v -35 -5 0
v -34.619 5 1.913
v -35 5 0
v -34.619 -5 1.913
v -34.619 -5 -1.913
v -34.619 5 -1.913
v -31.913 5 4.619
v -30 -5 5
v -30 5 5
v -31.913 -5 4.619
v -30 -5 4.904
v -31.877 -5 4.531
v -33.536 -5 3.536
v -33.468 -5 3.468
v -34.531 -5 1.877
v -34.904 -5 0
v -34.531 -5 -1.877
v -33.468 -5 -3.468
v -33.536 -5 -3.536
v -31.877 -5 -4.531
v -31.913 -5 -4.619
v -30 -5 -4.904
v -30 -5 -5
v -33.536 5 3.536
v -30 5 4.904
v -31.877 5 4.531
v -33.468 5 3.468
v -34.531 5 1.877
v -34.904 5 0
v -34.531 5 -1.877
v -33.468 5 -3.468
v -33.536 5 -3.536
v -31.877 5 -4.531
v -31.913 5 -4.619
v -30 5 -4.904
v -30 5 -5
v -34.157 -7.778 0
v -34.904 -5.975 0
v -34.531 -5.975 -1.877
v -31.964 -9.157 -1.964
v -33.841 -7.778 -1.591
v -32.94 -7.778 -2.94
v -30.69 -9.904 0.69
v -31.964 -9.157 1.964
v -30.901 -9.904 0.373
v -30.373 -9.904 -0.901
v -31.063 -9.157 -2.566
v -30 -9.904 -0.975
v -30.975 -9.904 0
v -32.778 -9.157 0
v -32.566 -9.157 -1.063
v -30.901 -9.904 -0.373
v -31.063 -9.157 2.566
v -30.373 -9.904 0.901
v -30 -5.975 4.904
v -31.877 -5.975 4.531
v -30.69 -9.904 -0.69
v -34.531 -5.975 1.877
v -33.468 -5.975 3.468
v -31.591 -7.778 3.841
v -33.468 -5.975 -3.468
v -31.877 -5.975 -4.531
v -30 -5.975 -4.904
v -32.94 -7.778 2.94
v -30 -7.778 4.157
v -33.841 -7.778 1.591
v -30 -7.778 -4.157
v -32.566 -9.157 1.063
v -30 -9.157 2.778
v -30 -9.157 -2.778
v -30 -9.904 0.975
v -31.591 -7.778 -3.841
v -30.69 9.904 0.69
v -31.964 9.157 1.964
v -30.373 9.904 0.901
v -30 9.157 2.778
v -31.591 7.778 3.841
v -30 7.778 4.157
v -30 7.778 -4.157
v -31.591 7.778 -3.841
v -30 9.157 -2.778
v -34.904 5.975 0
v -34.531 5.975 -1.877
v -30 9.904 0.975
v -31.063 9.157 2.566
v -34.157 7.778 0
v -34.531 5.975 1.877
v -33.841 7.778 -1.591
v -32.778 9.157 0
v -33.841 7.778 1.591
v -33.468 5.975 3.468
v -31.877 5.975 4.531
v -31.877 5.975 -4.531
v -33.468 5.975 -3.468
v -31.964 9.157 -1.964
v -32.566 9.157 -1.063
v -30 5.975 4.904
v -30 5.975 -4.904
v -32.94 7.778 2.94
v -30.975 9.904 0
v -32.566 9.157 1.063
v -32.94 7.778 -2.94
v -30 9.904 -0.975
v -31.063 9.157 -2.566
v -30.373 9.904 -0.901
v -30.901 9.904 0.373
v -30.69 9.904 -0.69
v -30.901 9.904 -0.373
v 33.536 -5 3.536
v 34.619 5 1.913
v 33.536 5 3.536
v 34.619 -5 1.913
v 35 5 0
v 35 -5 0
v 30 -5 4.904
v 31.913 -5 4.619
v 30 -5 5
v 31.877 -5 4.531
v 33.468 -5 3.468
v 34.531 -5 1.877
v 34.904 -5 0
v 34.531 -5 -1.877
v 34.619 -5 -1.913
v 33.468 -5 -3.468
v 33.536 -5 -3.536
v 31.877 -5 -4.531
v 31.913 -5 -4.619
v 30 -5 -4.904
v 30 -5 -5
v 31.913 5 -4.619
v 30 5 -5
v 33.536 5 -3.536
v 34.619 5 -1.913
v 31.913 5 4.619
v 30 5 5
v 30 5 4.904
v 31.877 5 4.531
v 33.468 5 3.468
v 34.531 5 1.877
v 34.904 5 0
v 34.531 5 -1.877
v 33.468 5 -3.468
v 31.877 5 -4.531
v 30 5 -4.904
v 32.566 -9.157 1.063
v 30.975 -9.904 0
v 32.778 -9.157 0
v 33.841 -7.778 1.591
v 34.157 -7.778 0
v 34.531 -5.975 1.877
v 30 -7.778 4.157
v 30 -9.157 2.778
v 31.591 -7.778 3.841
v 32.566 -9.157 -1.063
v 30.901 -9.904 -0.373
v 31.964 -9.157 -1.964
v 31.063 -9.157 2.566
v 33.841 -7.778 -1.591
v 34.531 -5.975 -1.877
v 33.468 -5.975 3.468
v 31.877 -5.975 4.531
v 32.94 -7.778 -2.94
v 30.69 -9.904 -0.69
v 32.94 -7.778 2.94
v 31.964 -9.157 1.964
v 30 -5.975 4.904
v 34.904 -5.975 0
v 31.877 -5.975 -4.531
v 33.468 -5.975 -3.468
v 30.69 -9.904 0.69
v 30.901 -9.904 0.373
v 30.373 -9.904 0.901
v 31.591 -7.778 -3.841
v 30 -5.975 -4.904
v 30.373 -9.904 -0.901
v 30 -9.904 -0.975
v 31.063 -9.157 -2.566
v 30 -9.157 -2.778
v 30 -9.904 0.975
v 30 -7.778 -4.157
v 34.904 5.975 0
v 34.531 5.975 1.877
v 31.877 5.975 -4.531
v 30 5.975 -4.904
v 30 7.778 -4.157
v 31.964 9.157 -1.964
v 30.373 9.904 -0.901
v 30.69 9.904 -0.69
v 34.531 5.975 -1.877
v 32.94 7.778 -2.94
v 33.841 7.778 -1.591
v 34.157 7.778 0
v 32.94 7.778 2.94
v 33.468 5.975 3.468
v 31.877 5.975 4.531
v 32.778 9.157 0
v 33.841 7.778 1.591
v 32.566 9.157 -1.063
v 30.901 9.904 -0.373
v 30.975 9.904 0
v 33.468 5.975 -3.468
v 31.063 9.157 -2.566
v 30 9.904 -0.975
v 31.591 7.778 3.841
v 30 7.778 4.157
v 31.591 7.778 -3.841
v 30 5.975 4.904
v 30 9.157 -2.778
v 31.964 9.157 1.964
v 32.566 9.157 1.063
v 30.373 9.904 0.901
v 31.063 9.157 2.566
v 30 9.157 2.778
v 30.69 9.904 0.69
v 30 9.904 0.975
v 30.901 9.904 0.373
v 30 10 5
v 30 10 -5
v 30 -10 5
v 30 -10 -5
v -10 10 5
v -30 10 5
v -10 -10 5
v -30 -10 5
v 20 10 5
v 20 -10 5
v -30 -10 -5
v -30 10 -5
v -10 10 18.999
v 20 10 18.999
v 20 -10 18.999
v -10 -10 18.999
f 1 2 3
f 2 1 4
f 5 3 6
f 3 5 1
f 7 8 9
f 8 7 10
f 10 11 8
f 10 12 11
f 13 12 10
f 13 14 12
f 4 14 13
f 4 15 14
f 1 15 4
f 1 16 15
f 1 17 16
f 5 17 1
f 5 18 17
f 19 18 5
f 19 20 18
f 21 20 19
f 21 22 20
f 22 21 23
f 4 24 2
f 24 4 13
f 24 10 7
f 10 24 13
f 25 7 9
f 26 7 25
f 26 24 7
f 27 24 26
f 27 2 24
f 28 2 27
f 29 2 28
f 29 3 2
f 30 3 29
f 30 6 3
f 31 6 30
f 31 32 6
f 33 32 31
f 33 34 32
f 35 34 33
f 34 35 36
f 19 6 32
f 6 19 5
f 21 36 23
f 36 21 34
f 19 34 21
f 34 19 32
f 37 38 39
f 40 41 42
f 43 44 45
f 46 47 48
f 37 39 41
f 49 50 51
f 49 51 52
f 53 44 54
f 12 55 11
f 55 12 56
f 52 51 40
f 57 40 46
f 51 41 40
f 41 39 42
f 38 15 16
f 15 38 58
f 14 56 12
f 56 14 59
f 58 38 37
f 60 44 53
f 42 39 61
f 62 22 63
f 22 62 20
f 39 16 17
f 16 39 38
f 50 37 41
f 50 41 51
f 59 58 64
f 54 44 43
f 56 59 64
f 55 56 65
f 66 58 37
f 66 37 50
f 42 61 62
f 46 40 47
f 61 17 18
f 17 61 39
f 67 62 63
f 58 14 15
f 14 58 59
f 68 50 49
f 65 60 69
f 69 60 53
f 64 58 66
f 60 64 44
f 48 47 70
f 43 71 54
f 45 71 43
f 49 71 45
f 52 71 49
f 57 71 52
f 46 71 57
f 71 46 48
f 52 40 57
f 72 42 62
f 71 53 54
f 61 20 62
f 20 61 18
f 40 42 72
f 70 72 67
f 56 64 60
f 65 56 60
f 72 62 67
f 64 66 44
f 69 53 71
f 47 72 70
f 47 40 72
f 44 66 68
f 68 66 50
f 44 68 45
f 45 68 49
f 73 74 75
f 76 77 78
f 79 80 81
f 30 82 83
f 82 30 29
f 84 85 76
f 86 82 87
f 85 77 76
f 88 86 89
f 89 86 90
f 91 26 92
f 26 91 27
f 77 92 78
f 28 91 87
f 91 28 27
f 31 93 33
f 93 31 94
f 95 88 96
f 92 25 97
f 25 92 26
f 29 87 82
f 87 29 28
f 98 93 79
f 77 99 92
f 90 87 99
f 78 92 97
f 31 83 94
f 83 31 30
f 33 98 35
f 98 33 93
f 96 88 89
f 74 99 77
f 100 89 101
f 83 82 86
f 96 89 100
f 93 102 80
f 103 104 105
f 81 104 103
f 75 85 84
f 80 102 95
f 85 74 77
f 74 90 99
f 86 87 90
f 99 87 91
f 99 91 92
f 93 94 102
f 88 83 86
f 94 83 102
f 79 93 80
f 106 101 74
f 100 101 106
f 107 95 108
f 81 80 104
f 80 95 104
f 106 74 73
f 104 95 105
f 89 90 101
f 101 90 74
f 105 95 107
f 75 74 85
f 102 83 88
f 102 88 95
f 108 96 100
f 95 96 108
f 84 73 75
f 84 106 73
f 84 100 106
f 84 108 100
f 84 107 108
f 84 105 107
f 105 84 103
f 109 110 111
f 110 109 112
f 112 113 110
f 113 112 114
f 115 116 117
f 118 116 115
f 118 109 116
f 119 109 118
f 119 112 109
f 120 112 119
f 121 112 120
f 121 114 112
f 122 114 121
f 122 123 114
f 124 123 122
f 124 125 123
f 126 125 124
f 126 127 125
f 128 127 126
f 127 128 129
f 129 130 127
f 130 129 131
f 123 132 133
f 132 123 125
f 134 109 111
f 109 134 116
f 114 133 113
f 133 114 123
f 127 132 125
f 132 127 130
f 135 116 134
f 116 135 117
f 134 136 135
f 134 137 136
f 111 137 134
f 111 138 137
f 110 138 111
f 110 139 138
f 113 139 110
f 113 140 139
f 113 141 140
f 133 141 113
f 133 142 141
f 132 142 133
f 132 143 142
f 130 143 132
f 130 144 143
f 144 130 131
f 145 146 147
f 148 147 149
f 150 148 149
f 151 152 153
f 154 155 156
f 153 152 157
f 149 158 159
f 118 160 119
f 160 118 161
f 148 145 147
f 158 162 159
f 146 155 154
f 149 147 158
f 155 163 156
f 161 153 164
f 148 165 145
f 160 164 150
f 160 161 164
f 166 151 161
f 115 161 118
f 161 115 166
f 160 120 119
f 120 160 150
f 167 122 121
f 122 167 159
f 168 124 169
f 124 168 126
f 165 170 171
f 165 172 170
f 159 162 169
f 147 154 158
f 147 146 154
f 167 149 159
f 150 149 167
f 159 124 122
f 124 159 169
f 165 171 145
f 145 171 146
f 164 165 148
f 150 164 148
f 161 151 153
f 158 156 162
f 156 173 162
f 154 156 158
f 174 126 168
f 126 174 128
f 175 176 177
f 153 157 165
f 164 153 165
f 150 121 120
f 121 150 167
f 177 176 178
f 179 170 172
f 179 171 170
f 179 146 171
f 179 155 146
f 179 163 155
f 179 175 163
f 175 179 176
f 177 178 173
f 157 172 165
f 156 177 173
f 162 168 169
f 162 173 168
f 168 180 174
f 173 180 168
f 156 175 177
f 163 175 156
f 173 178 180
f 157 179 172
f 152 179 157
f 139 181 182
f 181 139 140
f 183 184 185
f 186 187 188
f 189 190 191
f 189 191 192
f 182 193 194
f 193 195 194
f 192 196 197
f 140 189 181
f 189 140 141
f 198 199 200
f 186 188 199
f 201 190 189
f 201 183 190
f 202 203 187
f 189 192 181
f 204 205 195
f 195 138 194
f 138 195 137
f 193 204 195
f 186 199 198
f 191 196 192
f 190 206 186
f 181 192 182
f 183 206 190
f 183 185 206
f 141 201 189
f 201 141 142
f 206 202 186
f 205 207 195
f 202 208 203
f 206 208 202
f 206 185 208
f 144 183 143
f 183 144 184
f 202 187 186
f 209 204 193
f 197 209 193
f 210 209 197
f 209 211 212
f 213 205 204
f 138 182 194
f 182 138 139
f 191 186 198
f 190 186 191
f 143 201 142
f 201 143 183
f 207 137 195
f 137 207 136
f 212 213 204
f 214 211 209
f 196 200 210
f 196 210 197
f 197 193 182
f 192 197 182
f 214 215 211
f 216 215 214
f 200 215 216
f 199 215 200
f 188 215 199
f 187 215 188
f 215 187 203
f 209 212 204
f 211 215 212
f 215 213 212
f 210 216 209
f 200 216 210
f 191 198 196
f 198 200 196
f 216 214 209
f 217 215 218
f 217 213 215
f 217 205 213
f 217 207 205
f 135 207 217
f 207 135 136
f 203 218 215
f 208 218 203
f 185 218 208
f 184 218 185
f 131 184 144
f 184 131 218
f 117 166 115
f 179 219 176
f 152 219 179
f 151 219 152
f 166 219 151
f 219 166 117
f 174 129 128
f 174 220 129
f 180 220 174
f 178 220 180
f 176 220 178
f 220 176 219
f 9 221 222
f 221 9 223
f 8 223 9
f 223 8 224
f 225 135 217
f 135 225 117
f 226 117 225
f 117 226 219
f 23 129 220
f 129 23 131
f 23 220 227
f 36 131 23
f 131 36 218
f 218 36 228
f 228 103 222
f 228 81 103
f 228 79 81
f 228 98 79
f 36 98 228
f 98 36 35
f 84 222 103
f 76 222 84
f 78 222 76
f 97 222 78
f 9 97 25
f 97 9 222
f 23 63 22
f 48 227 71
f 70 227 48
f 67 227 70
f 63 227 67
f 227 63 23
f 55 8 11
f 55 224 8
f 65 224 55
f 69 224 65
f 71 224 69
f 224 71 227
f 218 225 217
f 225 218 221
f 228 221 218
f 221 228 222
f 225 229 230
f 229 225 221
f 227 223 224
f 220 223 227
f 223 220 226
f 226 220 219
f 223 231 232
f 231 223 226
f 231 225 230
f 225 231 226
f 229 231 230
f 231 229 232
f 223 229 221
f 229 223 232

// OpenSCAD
module body(base_height=10, top_height=14, base_length=60, top_length=30, width=20, top_offset=5, top=true, front_bumper=true, rear_bumper=true) {
    // Car body base
    color("silver") {
        cube([base_length, width, base_height], center=true);
    }
    
    // Car body top
    if (top) {
        color("red") {
        translate([top_offset, 0, base_height/2+top_height/2-0.001])
            cube([top_length, width, top_height], center=true);
        }
    }
    
    // Front bumper
    if (front_bumper){
    color("blue") {
        translate([-base_length/2, 0,0])
            rotate([90,0,0]) {
                cylinder(h=width - base_height, r = base_height/2, center=true);
                translate([0,0,(width - base_height)/2])
                    sphere(r=base_height/2);
                translate([0,0,-(width - base_height)/2])
                    sphere(r=base_height/2);
            }
        }
    }
    
    // Rear bumper
    if (rear_bumper) {
    color("blue") {
        translate([base_length/2, 0,0])
            rotate([90,0,0]) {
                cylinder(h=width - base_height, r = base_height/2, center=true);
                translate([0,0,(width - base_height)/2])
                    sphere(r=base_height/2);
                translate([0,0,-(width - base_height)/2])
                    sphere(r=base_height/2);
            }
        }
    }
}

//body(top=true, front_bumper=true, rear_bumper=false);

body();
